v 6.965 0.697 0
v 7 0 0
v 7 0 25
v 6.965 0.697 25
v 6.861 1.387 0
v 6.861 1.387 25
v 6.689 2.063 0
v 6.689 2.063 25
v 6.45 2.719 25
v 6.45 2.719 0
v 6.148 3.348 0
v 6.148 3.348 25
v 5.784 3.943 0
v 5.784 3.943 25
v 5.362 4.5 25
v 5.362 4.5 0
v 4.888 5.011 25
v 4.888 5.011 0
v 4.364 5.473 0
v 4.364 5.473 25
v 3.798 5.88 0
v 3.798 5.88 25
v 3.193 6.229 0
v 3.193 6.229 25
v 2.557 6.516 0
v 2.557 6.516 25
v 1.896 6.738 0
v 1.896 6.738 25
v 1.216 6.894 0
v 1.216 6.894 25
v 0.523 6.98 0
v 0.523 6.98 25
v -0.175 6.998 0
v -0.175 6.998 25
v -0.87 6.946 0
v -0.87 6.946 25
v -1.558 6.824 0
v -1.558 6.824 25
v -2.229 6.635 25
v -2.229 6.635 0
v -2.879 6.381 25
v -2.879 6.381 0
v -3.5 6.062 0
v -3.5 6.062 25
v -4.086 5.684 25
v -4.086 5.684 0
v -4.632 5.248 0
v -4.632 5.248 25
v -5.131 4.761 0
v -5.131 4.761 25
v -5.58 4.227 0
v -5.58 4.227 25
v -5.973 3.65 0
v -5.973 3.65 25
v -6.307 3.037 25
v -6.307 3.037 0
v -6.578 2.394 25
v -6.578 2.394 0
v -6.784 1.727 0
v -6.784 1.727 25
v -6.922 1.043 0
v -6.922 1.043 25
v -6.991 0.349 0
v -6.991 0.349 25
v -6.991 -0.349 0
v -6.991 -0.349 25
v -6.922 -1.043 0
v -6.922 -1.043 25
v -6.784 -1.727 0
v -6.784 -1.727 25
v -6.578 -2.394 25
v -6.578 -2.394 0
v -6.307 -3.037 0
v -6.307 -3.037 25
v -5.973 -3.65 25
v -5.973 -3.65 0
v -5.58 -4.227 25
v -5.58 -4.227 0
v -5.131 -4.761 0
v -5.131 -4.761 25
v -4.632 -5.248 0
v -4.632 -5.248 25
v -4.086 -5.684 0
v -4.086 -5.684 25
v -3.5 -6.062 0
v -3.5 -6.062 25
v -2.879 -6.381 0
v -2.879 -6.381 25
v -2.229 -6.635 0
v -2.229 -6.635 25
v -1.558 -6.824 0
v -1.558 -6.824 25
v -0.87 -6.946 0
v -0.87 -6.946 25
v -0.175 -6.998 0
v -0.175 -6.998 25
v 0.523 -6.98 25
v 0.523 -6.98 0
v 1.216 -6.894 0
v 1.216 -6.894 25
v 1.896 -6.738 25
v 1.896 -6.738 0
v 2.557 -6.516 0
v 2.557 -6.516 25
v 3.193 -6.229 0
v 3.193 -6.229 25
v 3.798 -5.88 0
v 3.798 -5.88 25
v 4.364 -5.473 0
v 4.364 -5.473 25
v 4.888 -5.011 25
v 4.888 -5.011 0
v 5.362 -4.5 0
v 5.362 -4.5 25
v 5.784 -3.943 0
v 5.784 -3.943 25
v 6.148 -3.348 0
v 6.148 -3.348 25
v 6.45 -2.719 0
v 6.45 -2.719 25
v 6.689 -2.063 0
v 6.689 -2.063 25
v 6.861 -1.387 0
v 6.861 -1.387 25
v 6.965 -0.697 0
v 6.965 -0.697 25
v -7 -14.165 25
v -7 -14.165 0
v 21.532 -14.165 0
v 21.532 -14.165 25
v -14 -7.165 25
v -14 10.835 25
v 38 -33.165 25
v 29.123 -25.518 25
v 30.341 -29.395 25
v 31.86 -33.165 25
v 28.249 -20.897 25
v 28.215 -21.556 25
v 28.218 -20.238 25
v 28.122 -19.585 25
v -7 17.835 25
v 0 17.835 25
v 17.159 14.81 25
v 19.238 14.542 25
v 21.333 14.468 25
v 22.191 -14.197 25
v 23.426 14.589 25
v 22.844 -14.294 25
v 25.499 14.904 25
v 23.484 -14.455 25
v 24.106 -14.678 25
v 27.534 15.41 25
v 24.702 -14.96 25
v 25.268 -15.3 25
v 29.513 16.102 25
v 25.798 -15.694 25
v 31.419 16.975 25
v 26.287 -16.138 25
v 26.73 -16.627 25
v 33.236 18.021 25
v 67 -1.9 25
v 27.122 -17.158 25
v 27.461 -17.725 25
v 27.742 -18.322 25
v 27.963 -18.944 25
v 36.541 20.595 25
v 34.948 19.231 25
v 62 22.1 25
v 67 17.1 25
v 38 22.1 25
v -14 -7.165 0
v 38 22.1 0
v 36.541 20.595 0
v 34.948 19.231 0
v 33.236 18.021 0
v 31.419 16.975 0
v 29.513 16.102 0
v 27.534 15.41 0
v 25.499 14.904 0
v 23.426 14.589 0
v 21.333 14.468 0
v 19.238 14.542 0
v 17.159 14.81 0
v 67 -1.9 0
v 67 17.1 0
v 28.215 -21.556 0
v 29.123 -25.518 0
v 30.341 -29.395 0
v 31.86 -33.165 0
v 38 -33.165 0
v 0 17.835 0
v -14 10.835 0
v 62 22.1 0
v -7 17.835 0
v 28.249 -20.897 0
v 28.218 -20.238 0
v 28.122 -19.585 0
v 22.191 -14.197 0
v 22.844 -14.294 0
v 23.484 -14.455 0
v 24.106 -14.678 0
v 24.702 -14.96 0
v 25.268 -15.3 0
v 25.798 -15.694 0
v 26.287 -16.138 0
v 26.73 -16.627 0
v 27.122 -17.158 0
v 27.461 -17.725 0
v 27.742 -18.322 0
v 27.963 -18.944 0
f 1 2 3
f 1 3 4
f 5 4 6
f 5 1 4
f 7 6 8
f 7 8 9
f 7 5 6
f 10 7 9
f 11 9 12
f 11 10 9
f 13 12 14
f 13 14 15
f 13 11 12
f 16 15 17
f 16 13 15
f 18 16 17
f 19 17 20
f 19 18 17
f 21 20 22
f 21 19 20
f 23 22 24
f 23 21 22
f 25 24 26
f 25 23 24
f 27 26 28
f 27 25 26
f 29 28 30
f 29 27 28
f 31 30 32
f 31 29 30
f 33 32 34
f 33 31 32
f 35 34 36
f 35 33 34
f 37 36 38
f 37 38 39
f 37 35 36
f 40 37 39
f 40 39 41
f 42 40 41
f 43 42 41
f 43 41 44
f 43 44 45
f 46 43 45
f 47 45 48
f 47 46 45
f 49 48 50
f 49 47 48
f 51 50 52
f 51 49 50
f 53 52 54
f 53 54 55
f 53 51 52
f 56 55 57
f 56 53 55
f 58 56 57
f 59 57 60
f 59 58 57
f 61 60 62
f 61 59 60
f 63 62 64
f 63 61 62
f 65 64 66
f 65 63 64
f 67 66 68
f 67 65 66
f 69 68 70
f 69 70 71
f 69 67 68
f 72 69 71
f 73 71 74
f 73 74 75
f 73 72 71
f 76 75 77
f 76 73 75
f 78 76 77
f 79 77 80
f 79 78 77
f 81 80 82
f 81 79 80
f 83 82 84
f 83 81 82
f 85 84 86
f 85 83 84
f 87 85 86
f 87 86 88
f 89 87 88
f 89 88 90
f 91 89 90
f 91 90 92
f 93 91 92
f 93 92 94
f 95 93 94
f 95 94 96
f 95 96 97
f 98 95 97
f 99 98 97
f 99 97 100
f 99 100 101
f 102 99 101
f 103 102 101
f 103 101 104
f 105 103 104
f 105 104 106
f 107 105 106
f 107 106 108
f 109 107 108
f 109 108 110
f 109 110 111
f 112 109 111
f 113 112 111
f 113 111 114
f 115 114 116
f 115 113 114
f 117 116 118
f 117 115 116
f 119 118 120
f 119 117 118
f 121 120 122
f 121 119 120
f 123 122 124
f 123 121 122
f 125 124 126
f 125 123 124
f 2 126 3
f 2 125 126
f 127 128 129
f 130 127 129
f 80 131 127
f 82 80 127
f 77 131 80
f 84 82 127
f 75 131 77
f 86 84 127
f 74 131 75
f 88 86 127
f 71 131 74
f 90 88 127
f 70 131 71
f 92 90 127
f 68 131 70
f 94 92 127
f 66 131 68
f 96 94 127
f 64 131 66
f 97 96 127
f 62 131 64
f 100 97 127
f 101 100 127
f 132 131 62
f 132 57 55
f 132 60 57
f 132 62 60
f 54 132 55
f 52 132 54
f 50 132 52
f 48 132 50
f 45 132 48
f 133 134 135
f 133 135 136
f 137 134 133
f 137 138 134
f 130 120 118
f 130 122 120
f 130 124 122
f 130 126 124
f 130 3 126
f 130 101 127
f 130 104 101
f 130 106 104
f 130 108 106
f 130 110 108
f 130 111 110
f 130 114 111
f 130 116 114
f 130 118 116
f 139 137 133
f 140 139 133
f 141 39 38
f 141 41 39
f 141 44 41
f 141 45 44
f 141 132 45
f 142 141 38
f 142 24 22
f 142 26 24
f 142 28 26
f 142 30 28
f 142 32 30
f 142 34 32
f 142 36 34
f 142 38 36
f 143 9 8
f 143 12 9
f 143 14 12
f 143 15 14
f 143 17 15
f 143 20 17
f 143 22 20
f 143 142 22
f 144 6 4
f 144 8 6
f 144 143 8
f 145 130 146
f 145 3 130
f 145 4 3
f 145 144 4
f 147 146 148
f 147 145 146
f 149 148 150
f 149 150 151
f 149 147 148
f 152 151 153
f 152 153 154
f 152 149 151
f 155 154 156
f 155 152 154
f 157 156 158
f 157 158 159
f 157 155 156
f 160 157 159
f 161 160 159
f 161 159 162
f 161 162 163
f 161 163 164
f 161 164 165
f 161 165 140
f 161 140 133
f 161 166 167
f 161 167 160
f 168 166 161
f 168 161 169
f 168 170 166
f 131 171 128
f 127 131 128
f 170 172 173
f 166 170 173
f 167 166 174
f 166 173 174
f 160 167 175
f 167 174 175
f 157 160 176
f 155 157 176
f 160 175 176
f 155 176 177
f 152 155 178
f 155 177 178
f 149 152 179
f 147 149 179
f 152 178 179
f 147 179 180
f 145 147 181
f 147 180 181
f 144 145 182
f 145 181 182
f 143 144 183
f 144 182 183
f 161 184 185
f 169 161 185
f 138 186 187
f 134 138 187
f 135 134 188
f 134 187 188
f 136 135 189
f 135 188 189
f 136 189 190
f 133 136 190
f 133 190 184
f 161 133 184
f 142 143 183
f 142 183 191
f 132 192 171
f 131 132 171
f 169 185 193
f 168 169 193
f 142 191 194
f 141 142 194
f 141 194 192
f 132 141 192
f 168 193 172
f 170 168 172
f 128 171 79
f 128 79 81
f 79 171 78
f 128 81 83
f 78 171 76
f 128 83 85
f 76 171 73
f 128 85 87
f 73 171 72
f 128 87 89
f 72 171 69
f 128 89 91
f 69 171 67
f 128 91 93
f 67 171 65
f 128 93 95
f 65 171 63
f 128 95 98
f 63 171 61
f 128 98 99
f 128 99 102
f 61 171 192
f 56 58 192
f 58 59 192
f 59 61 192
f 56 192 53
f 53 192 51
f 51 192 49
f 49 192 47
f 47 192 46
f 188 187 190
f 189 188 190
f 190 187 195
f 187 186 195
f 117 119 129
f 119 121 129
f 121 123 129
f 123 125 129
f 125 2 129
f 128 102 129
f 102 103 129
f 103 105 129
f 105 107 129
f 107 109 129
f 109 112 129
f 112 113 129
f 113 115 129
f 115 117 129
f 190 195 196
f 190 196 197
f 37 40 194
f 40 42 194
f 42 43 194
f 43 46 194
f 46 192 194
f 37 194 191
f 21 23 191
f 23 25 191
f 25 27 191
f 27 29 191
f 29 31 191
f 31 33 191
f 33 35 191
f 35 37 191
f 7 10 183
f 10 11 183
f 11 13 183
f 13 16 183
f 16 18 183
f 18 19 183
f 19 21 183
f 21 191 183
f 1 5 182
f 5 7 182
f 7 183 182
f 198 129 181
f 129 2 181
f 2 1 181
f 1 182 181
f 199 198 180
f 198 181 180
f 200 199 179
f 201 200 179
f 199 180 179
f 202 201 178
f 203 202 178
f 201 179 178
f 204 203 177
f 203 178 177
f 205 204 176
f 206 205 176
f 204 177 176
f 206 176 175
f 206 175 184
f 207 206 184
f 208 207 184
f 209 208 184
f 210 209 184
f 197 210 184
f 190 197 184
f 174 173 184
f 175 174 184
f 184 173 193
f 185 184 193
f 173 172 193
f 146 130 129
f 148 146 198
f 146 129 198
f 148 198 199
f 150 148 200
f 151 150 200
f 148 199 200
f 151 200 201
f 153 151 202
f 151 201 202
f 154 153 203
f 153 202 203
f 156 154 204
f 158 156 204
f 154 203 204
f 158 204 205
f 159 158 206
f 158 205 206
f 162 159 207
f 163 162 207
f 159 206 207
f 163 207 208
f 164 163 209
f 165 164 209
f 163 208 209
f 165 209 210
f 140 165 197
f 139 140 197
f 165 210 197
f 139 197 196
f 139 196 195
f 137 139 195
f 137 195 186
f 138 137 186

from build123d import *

# Parameters (mm, degrees)
F0_R     = 7
F1_DEPTH = 25


with BuildPart() as f1:
    # F0 (on Top) → F1 (new body)
    with BuildSketch(Plane.XY):
        with BuildLine():
            Line((-14, 10.835116), (-14, -7.164884))
            Line((-14, -7.164884), (-7, -14.164884))
            Line((-7, -14.164884), (21.531938, -14.164884))
            ThreePointArc((21.531938, -14.164884), (26.514214, -16.377042), (28.214635, -21.556355))
            ThreePointArc((28.214635, -21.556355), (29.693689, -27.468479), (31.859744, -33.164884))
            Line((31.859744, -33.164884), (38, -33.164884))
            Line((38, -33.164884), (67, -1.89979))
            Line((67, -1.89979), (67, 17.10021))
            Line((67, 17.10021), (62, 22.10021))
            Line((62, 22.10021), (38, 22.10021))
            ThreePointArc((38, 22.10021), (28.531551, 15.73269), (17.158568, 14.809598))
            Line((17.158568, 14.809598), (0, 17.835116))
            Line((0, 17.835116), (-7, 17.835116))
            Line((-7, 17.835116), (-14, 10.835116))
        make_face()
        Circle(F0_R, mode=Mode.SUBTRACT)
    extrude(amount=F1_DEPTH)


solid = f1.part
